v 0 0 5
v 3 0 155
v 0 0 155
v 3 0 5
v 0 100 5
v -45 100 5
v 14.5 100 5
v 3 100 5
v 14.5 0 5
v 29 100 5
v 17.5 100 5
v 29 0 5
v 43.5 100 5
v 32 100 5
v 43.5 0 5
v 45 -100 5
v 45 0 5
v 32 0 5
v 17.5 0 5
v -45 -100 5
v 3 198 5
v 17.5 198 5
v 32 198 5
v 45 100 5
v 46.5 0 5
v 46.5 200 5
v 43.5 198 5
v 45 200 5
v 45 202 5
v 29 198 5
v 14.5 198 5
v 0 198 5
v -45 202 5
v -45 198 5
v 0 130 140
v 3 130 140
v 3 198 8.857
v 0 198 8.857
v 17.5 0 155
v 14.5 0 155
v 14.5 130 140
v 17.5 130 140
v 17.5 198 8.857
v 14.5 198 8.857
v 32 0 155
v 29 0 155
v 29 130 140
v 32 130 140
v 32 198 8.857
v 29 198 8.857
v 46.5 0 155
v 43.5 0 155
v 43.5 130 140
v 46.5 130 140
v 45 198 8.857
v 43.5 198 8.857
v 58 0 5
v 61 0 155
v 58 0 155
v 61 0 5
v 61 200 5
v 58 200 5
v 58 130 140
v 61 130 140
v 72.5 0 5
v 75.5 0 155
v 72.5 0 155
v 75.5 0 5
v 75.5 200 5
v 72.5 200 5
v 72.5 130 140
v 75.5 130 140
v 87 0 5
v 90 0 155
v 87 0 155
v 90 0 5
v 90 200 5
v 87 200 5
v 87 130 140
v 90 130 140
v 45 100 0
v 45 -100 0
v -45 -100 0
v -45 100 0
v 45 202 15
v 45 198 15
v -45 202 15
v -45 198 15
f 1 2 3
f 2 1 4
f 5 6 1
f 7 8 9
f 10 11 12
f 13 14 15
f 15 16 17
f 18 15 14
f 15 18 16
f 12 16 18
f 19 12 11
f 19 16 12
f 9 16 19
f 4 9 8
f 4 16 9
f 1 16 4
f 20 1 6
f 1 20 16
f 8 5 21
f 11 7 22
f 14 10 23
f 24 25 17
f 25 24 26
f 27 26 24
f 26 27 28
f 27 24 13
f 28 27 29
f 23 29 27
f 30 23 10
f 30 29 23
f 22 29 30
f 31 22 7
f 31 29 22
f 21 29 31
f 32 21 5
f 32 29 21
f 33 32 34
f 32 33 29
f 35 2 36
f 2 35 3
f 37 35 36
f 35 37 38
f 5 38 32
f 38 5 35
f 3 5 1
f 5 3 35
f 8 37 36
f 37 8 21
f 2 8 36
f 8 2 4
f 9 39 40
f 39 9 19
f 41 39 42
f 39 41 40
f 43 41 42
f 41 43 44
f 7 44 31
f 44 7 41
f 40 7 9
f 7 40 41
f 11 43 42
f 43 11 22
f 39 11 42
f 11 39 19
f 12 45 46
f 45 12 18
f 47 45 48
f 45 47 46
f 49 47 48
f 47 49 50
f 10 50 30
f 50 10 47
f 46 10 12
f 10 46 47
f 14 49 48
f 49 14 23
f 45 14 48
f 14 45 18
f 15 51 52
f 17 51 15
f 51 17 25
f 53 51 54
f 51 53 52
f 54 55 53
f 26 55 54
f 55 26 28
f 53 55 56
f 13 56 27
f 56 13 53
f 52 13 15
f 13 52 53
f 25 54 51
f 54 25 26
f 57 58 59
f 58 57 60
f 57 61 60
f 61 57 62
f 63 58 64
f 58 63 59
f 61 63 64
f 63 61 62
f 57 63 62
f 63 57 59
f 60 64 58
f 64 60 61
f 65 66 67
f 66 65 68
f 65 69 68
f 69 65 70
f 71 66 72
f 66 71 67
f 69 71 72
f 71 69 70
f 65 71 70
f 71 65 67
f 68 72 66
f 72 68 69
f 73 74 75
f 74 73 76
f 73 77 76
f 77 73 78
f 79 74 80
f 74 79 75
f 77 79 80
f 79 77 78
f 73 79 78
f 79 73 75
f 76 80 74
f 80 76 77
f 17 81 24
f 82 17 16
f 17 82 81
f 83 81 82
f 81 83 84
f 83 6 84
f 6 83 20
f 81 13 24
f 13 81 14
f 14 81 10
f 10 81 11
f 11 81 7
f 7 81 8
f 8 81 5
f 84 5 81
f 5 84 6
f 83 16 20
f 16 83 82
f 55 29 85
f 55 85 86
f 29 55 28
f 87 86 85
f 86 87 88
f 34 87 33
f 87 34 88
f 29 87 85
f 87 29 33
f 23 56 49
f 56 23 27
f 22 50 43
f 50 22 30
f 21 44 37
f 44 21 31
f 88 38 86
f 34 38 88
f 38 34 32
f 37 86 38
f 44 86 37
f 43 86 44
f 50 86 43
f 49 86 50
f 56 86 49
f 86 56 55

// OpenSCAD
// file: BOSL2/std.scad
// Minimal BOSL2 compatibility shim for bundled gallery models.
// It implements only the helpers used by the imported OpenSCAD projects.

CENTER = [0, 0, 0];
BOTTOM = [0, 0, -1];
TOP = [0, 0, 1];
LEFT = [-1, 0, 0];
RIGHT = [1, 0, 0];
FRONT = [0, -1, 0];
BACK = [0, 1, 0];

module up(z=0) {
    translate([0, 0, z]) children();
}

module down(z=0) {
    translate([0, 0, -z]) children();
}

module attach(anchor=CENTER) {
    children();
}

module cuboid(size=[1, 1, 1], anchor=CENTER) {
    center = anchor == CENTER;
    translate(center ? [0, 0, 0] : [0, 0, size[2] / 2])
        cube(size, center=true);
    children();
}

module xcyl(h=1, r=1, anchor=CENTER) {
    center = anchor == CENTER;
    translate(center ? [0, 0, 0] : [h / 2, 0, 0])
        rotate([0, 90, 0])
            cylinder(h=h, r=r, center=true);
}
// main file
include <BOSL2/std.scad>;

platform_target_width = 100;
platform_depth = 200;
platform_height = 5;

fin_width = 3;
fin_spacing = 11.5;
fin_height_back = 150;
fin_height_front = 0;

lip_thickness = 4;
lip_drop = 5;

fin_point_front_ratio = 0.65;  // fraction from Kelly back (0) to Kelly front (1)
fin_point_height_ratio = 0.9;  // ≈ 180mm with current heights (200 → 20mm drop)

can_diameter = 66;
can_height = 122;
can_clearance = 10;

// Recursively generate fin [x_pos, width] pairs that fit across the platform width.
function fin_layout(x_pos = 0) =
    (x_pos + fin_width <= platform_target_width)
        ? concat([[x_pos, fin_width]], fin_layout(x_pos + fin_width + fin_spacing))
        : [];

fin_pairs = fin_layout();
final_platform_width = len(fin_pairs) > 0
    ? fin_pairs[len(fin_pairs) - 1][0] + fin_pairs[len(fin_pairs) - 1][1]
    : 0;

module cutting_board_stand() {
    base_platform();
    fins();
    front_lip();
}

module base_platform() {
    cuboid([final_platform_width, platform_depth, platform_height], anchor=BOTTOM+FRONT+LEFT);
}

module fins() {
    for (fin_pair = fin_pairs)
        fin(fin_pair[0], fin_pair[1]);
}

module fin(x_pos, width) {
    os_front_top = platform_height + fin_height_back;
    os_back_top = platform_height + fin_height_front;
    point_y = platform_depth * fin_point_front_ratio;
    highest_height = max(fin_height_front, fin_height_back);
    point_top = platform_height + highest_height * fin_point_height_ratio;

    points = [
        [x_pos, 0, platform_height],                     // 0 front bottom left (OS front / Kelly back)
        [x_pos + width, 0, platform_height],             // 1 front bottom right
        [x_pos + width, 0, os_front_top],                // 2 front top right
        [x_pos, 0, os_front_top],                        // 3 front top left
        [x_pos, point_y, point_top],                     // 4 knee left
        [x_pos + width, point_y, point_top],             // 5 knee right
        [x_pos, platform_depth, os_back_top],            // 6 back top left (Kelly front)
        [x_pos + width, platform_depth, os_back_top],    // 7 back top right
        [x_pos, platform_depth, platform_height],        // 8 back bottom left
        [x_pos + width, platform_depth, platform_height] // 9 back bottom right
    ];

    faces = [
        [0, 1, 2], [0, 2, 3],
        [8, 6, 7], [8, 7, 9],
        [0, 8, 9], [0, 9, 1],
        [3, 2, 5], [3, 5, 4],
        [4, 5, 7], [4, 7, 6],
        [0, 3, 4], [0, 4, 6], [0, 6, 8],
        [1, 5, 2], [1, 7, 5], [1, 9, 7]
    ];

    polyhedron(points = points, faces = faces);
}

module front_lip() {
    translate([0, platform_depth, platform_height])
        cuboid(
            [final_platform_width, lip_thickness, platform_height + lip_drop],
            anchor=TOP+FRONT+LEFT
        );
}

cutting_board_stand();
